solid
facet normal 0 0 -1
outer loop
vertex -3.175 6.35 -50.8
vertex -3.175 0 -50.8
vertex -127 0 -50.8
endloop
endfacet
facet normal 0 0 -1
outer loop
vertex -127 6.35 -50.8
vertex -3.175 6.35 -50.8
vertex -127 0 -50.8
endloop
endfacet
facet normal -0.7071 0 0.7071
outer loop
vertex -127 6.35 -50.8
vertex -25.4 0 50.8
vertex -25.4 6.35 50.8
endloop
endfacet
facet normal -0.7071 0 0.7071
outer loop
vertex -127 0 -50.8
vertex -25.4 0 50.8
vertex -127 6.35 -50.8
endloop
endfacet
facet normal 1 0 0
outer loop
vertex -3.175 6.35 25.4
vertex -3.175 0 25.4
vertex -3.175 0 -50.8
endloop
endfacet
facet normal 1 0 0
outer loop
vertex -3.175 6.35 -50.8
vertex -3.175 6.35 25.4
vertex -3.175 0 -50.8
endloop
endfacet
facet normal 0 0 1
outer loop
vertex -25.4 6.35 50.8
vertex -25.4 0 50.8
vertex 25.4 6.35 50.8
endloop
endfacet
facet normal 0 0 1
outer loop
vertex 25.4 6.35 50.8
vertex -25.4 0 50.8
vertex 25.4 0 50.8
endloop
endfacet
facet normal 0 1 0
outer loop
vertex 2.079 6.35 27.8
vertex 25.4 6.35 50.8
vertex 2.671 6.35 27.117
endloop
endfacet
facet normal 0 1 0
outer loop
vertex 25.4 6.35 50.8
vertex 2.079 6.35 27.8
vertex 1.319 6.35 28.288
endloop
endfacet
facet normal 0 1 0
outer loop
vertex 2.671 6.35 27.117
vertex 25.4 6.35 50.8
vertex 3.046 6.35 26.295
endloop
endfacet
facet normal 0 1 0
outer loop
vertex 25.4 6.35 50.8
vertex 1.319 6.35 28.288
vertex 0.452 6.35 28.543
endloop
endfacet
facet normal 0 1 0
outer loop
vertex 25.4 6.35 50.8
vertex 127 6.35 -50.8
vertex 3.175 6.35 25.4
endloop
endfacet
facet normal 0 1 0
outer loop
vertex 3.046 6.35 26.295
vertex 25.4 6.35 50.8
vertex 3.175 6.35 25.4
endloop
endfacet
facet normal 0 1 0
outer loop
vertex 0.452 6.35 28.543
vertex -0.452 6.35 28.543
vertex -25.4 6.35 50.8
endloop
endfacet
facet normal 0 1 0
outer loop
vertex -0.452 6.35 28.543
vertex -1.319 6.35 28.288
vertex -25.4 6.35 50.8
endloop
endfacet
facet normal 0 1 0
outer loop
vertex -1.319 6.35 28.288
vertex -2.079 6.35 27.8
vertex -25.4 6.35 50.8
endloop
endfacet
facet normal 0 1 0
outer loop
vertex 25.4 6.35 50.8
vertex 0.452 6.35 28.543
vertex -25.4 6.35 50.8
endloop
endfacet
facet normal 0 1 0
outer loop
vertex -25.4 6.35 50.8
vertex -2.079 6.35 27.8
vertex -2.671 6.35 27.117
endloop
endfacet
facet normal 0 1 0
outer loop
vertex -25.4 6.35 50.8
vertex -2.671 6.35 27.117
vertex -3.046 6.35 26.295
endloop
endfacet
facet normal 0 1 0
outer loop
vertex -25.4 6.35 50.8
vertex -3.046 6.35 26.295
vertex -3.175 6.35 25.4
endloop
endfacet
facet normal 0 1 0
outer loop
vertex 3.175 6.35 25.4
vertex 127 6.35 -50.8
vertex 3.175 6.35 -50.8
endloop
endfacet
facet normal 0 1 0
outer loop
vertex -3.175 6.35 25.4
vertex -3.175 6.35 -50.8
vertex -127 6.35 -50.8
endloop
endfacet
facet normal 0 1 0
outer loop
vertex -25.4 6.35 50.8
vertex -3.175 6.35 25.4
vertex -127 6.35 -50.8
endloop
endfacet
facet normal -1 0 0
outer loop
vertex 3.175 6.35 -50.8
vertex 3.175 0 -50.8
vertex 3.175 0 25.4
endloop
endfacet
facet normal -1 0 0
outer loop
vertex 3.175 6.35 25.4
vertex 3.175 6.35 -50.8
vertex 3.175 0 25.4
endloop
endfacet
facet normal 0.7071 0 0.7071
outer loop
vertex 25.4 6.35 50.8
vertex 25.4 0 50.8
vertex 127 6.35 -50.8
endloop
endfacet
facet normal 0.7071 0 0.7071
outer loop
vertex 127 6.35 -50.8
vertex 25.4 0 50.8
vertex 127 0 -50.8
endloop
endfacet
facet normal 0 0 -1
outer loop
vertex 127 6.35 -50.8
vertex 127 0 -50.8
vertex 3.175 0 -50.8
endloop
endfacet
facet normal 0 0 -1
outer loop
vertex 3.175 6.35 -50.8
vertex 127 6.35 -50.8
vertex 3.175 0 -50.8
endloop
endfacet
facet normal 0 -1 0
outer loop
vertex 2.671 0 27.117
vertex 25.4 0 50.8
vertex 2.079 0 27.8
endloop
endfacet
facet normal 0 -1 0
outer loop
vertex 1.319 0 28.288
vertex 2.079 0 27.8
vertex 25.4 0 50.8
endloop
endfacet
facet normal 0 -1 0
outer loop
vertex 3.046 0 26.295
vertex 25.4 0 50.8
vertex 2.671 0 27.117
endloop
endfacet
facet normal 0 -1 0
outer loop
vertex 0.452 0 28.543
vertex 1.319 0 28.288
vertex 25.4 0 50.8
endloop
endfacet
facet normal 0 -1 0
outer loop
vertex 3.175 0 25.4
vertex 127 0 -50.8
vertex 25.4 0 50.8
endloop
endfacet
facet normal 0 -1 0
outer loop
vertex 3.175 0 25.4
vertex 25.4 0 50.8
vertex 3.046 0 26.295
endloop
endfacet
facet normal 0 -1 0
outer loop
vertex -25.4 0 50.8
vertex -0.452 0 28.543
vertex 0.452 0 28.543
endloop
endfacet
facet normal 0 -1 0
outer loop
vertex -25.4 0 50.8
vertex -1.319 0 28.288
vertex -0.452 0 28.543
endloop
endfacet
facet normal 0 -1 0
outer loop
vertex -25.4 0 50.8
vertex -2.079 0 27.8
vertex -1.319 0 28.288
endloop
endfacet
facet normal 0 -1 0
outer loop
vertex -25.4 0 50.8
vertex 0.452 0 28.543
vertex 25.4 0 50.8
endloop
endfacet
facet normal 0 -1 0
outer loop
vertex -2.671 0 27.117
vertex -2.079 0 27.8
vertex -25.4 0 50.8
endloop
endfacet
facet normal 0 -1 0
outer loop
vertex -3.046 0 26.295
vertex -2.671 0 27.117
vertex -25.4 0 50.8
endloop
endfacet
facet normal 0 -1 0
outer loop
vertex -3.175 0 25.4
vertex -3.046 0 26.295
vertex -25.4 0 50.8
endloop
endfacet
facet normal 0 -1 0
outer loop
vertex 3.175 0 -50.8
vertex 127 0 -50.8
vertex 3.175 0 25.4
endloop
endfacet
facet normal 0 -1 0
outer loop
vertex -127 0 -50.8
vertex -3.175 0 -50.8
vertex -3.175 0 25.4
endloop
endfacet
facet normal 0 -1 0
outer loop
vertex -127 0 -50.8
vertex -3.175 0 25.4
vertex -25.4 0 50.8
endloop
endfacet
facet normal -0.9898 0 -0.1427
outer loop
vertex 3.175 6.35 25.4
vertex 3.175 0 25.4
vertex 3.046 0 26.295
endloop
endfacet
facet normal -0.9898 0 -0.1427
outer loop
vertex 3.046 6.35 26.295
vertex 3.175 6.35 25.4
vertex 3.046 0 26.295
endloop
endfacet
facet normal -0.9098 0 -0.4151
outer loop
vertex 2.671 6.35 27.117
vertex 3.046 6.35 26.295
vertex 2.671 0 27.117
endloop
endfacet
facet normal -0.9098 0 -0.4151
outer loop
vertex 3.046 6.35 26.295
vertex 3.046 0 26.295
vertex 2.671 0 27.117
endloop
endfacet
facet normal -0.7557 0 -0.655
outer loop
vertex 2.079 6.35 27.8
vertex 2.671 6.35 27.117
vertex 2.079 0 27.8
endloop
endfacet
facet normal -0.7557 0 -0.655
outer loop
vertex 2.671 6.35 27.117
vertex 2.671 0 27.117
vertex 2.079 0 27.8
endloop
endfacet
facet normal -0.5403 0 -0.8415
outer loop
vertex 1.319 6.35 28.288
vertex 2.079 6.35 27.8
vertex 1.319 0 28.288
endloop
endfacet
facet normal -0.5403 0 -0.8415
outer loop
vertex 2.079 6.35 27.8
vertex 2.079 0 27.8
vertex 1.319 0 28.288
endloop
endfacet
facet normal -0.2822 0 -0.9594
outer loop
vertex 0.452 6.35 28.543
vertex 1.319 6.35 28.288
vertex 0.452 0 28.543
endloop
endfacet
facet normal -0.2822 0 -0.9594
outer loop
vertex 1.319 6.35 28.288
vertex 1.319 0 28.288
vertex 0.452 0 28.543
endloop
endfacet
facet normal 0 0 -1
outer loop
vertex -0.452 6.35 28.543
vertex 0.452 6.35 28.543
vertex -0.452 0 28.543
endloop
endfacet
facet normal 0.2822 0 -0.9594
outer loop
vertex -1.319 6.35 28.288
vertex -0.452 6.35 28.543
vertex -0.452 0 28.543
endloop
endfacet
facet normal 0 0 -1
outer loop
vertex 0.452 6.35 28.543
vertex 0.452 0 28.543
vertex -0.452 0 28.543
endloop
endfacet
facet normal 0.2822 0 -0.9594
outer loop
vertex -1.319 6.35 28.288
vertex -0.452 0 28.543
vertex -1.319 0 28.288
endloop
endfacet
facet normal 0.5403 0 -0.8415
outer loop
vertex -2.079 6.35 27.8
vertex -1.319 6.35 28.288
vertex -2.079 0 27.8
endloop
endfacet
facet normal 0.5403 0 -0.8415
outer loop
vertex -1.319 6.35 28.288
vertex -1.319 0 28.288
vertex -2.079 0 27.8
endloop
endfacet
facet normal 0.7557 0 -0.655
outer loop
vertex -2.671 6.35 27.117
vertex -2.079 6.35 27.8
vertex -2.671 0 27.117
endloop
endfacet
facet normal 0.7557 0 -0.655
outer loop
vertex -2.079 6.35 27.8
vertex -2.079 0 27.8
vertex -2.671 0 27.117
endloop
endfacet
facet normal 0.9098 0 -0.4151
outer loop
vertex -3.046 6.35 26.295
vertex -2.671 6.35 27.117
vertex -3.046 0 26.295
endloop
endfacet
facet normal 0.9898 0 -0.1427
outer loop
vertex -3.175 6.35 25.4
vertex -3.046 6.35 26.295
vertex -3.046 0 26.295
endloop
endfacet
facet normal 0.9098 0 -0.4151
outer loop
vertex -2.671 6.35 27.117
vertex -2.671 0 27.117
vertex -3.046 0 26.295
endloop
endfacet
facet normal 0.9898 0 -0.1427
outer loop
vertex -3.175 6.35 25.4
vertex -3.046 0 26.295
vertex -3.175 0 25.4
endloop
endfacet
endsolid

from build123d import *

# Parameters (mm, degrees)
BOSS_EXTRUDE1_DEPTH = 6.35


with BuildPart() as part:
    # Sketch1 → Boss-Extrude1 (new body)
    with BuildSketch(Plane(origin=(0, 0, 0), x_dir=(1, 0, 0), z_dir=(0, 1, 0))):
        Polygon((-127, 50.8), (-25.4, 50.8), (-25.4, -50.8), align=None)
        with BuildLine():
            Line((-25.4, 50.8), (-25.4, -50.8))
            Line((-25.4, -50.8), (25.4, -50.8))
            Line((25.4, -50.8), (25.4, 50.8))
            Line((25.4, 50.8), (3.175, 50.8))
            Line((3.175, 50.8), (3.175, -25.4))
            ThreePointArc((3.175, -25.4), (0, -28.575), (-3.175, -25.4))
            Line((-3.175, -25.4), (-3.175, 50.8))
            Line((-3.175, 50.8), (-25.4, 50.8))
        make_face()
        Polygon((25.4, -50.8), (127, 50.8), (25.4, 50.8), align=None)
    extrude(amount=BOSS_EXTRUDE1_DEPTH)


solid = part.part
